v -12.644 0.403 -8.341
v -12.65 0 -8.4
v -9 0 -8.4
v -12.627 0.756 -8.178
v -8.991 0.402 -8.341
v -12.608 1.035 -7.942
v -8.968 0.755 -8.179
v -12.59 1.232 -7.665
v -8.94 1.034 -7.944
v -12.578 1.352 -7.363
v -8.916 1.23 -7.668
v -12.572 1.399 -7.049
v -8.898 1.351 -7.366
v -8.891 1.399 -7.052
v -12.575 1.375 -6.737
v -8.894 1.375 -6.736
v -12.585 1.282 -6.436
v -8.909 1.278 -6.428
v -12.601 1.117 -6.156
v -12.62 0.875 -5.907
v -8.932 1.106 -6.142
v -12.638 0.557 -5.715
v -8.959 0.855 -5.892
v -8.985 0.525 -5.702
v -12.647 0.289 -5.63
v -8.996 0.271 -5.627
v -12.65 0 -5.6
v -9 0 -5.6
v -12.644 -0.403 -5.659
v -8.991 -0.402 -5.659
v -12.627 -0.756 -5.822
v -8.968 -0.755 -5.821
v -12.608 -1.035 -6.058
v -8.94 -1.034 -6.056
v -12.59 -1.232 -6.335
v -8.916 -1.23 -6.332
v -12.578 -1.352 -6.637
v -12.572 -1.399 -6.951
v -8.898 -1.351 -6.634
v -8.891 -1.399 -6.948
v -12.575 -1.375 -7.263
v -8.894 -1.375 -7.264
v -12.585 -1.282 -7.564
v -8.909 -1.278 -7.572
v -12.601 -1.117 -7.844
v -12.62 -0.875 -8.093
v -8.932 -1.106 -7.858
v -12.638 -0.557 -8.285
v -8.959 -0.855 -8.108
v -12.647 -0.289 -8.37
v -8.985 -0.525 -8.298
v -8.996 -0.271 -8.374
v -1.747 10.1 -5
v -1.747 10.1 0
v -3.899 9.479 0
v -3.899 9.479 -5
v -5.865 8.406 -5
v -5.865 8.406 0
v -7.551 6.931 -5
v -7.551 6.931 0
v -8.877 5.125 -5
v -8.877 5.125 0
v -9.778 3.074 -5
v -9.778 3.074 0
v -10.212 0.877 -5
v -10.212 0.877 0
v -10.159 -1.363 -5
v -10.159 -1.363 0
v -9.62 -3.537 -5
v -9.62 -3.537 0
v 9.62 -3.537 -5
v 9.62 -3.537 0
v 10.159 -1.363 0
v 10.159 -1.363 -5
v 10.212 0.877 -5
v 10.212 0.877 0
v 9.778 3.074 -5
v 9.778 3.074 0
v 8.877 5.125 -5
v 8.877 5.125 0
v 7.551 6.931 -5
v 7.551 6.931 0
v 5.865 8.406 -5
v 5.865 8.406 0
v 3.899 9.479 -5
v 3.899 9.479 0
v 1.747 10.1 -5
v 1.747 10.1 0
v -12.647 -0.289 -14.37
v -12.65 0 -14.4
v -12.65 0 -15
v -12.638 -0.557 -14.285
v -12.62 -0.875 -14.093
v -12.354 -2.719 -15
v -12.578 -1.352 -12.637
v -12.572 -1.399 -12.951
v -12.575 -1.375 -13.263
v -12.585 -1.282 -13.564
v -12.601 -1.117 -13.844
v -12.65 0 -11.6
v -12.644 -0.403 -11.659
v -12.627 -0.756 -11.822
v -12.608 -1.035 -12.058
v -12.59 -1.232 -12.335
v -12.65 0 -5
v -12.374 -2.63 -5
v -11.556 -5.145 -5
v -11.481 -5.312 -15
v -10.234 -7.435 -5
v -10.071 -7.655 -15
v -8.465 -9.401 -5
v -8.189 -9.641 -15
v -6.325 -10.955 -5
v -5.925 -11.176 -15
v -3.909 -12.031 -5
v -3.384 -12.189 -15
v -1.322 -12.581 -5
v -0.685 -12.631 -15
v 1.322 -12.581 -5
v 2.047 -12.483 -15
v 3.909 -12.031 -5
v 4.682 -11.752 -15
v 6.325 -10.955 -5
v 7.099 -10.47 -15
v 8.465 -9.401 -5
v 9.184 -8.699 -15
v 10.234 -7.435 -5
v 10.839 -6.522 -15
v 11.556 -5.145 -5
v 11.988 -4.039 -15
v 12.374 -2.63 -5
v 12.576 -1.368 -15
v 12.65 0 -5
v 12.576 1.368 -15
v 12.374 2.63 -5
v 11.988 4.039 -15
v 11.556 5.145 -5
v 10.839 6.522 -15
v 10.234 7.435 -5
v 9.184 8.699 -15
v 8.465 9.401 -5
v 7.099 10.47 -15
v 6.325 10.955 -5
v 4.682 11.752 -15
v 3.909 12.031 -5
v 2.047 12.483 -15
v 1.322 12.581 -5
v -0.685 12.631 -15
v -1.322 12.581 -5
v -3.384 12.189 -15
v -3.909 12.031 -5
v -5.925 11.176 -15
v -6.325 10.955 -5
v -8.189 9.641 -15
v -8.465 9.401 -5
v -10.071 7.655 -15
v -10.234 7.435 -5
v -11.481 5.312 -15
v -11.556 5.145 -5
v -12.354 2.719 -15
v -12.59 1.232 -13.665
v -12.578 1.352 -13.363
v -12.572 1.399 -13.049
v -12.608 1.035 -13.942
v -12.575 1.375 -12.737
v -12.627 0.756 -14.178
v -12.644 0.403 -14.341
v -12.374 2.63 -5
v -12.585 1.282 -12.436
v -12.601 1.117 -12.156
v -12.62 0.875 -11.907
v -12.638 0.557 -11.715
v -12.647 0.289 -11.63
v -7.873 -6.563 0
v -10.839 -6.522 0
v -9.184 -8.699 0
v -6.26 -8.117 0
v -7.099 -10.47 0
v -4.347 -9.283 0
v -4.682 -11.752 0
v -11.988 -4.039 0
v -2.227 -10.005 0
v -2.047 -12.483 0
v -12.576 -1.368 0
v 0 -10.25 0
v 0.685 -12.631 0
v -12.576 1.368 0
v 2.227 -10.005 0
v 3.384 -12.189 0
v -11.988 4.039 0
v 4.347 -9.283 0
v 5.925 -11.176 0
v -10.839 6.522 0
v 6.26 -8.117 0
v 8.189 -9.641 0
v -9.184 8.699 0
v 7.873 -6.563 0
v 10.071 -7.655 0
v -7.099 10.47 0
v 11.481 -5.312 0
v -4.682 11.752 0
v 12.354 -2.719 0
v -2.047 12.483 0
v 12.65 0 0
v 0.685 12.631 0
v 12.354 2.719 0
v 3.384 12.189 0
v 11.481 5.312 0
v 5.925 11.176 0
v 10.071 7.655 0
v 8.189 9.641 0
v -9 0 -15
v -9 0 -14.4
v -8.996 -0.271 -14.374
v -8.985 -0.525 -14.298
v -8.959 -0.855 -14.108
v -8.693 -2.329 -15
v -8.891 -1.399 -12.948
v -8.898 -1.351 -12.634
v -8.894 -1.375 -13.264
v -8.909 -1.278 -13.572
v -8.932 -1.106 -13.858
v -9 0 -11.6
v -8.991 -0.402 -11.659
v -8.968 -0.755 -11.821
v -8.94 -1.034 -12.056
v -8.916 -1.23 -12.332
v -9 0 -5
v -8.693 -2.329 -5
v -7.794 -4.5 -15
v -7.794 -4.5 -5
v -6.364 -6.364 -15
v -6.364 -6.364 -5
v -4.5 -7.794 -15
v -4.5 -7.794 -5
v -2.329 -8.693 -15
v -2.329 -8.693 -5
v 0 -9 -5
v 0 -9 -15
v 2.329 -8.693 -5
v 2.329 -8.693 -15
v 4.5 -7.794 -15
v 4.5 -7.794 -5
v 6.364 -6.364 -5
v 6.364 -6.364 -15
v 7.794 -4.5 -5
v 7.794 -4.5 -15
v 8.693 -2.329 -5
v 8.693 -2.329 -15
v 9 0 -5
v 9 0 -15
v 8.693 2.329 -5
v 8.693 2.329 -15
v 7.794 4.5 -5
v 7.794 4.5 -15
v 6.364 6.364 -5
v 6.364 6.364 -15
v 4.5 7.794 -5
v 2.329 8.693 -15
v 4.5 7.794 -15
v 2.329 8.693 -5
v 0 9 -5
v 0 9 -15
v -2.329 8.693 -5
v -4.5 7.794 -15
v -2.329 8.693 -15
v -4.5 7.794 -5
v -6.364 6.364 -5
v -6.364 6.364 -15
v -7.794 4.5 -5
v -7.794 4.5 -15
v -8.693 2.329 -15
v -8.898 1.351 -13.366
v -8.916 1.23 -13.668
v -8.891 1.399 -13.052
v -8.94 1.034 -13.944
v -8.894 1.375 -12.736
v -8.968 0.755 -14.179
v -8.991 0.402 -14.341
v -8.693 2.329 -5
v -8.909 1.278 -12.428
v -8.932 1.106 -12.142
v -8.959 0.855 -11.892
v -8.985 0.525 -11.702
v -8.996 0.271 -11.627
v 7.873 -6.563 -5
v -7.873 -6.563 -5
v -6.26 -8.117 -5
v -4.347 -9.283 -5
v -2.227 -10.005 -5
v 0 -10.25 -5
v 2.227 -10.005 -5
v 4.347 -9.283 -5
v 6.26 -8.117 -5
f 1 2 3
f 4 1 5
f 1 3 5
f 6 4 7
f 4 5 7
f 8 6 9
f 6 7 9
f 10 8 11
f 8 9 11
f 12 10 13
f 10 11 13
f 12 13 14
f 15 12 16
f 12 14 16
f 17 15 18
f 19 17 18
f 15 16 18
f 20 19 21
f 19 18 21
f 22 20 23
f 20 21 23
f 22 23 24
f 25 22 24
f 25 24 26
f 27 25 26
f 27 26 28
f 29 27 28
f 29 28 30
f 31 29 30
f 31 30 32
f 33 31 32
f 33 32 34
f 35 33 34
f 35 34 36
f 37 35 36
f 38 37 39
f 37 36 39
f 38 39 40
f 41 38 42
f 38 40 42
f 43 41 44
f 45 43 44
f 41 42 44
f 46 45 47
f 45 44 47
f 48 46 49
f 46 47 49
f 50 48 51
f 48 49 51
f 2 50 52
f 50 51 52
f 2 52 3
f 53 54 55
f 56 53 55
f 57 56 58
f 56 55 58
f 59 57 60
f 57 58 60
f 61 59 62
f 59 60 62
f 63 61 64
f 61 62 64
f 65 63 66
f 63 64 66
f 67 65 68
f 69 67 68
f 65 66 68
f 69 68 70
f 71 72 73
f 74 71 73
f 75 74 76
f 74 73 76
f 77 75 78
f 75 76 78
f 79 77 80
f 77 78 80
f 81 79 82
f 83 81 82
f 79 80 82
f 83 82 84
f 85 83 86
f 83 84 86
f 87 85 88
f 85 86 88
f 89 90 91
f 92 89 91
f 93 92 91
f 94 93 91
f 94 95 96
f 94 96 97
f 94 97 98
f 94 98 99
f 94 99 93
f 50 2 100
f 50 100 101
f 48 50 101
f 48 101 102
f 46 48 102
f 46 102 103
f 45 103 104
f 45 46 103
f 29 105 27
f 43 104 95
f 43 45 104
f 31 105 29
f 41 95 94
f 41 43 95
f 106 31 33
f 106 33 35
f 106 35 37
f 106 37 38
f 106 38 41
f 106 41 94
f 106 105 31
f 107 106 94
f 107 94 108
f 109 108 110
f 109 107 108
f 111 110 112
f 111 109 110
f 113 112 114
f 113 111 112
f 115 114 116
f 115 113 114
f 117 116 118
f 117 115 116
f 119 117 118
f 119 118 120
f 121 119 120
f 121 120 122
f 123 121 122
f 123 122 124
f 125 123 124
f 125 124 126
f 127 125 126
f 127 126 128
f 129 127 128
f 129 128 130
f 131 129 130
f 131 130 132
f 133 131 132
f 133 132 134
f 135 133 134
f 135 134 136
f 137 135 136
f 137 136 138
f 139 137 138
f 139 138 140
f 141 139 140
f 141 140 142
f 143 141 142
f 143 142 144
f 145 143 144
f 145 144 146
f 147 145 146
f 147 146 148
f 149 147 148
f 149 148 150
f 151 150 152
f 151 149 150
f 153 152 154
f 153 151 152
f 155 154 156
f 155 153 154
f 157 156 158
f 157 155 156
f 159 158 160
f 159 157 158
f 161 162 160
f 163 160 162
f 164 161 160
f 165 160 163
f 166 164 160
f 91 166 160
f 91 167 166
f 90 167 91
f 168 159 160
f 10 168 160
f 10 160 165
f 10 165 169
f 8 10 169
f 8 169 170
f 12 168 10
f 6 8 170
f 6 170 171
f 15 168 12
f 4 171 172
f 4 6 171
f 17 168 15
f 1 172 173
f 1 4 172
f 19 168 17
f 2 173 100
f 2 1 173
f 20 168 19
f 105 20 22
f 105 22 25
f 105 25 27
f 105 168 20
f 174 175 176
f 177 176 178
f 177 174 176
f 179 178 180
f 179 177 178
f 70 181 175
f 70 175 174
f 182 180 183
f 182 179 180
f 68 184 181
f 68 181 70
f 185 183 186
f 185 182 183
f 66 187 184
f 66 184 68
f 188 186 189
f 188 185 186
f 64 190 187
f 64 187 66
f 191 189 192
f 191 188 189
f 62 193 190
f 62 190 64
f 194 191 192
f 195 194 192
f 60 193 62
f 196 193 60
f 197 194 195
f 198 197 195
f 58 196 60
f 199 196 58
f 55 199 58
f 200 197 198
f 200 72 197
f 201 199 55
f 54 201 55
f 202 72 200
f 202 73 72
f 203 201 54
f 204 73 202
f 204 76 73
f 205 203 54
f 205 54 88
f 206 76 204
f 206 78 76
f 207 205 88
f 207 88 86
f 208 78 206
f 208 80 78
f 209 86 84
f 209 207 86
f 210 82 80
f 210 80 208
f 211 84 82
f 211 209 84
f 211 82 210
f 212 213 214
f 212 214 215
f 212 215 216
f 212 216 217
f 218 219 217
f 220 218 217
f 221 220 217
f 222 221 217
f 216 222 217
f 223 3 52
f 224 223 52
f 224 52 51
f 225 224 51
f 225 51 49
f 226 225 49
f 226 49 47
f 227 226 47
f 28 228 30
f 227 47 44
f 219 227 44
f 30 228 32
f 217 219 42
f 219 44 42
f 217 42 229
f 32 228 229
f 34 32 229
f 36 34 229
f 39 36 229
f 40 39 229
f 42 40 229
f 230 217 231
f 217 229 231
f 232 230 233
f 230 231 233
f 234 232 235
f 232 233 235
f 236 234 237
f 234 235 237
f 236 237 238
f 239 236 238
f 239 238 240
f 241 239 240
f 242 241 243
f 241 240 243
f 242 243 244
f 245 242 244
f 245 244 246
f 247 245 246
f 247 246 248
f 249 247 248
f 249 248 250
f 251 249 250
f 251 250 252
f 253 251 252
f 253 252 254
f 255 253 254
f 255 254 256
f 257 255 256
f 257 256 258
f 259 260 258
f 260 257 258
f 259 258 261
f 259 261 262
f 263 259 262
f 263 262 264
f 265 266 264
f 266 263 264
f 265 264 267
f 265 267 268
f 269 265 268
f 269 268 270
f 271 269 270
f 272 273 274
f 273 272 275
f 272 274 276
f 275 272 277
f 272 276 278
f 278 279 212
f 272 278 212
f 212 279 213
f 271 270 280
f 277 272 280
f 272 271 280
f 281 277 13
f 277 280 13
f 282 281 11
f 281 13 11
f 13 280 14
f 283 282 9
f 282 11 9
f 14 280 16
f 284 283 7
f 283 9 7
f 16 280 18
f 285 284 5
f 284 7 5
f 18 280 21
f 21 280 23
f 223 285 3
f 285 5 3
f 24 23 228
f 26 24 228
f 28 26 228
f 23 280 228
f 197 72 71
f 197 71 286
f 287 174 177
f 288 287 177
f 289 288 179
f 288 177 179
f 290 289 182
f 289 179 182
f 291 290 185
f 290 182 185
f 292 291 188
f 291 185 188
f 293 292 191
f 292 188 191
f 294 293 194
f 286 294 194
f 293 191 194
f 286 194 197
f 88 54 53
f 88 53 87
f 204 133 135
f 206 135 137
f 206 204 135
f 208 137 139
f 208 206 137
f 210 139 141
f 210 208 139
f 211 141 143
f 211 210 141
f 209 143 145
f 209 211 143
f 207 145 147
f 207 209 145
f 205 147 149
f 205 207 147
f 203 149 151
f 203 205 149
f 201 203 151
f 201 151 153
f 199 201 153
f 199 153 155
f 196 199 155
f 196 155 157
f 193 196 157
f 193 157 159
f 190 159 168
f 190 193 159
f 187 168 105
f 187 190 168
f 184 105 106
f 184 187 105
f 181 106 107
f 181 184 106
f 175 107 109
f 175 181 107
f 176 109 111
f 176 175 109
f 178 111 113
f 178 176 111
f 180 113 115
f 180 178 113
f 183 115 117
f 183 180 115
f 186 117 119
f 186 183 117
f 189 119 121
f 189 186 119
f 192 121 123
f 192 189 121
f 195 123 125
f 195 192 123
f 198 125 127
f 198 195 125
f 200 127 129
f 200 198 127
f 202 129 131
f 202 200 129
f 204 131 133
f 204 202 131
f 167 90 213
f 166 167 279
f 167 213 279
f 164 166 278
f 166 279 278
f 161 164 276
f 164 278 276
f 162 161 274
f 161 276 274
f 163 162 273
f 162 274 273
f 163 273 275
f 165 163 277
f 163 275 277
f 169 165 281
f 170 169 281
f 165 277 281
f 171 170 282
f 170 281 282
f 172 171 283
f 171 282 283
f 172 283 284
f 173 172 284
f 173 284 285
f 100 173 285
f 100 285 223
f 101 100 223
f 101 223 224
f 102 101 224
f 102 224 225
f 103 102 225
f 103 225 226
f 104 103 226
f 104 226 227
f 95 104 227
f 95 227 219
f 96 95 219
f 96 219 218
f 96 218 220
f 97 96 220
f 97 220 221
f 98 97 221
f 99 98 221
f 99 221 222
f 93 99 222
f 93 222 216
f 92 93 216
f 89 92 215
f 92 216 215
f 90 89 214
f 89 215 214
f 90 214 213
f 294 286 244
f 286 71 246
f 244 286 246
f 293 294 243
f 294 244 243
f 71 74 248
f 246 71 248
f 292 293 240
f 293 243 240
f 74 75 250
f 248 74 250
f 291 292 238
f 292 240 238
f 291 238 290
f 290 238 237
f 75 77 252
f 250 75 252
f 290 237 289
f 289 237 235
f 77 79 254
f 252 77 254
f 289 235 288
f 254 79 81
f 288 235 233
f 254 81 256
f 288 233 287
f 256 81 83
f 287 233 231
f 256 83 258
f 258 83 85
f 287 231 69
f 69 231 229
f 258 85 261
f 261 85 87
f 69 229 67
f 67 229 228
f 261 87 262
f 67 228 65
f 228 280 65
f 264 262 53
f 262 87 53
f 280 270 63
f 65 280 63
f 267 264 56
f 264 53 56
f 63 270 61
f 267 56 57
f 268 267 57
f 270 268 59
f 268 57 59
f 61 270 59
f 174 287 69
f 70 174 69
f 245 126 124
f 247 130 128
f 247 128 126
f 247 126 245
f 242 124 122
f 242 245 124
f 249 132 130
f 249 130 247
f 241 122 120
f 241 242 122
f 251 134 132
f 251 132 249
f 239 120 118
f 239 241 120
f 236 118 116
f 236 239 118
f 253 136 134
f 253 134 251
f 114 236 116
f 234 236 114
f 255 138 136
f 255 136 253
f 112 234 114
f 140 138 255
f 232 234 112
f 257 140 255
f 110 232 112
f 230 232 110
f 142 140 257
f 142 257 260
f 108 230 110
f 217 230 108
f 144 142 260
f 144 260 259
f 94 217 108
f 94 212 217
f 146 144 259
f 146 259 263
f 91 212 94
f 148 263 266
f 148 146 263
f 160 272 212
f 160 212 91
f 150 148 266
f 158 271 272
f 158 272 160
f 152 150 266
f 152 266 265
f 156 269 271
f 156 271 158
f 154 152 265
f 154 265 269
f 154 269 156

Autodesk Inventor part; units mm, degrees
ref_plane "YZ Plane" through (0, 0, 0) normal (1, 0, 0) x (0, 1, 0)
ref_plane "XZ Plane" through (0, 0, 0) normal (0, 1, 0) x (-1, 0, 0)
ref_plane "XY Plane" through (0, 0, 0) normal (0, 0, 1) x (1, 0, 0)
sketch "Sketch1" plane through (0, 0, 0) normal (0, 0, 1) x (1, 0, 0)
  line L0 (9.6801, -14.008) -> (7.2052, -11.5331) construction
  line L1 (7.2052, -11.5331) -> (11.5893, -7.1491) construction
  line L2 (11.5893, -7.1491) -> (14.0642, -9.6239) construction
  line L3 (14.0642, -9.6239) -> (9.6801, -14.008) construction
  arc A0 (12.6369, -4.7496) -> (4.7496, -12.6369) centre (0, 0) ccw construction
  line L4 (10.9298, -3.0424) -> (12.6369, -4.7496) construction
  line L5 (11.6618, -4.6122) -> (10.9298, -3.0424) construction
  arc A1 (11.6618, -4.6122) -> (10.8551, -4.47) centre (11.2086, -4.8235) ccw construction
  line L6 (10.7915, -4.5335) -> (10.8551, -4.47) construction
  arc A2 (10.7915, -4.5335) -> (10.6527, -4.9738) centre (11.1451, -4.887) ccw construction
  line L7 (10.915, -6.4612) -> (10.6527, -4.9738) construction
  arc A3 (10.7761, -6.9016) -> (10.915, -6.4612) centre (10.4226, -6.548) ccw construction
  line L8 (6.9016, -10.7761) -> (10.7761, -6.9016) construction
  arc A4 (6.4612, -10.915) -> (6.9016, -10.7761) centre (6.548, -10.4226) ccw construction
  line L9 (6.4612, -10.915) -> (4.9738, -10.6527) construction
  arc A5 (4.9738, -10.6527) -> (4.5335, -10.7915) centre (4.887, -11.1451) ccw construction
  line L10 (4.5335, -10.7915) -> (4.47, -10.8551) construction
  arc A6 (4.47, -10.8551) -> (4.6122, -11.6618) centre (4.8235, -11.2086) ccw construction
  line L11 (4.6122, -11.6618) -> (3.0424, -10.9298) construction
  line L12 (3.0424, -10.9298) -> (4.7496, -12.6369) construction
  line L13 (-1.7167, -14.6498) -> (-1.7167, -17.5) construction
  line L14 (-1.7167, -17.5) -> (1.7167, -17.5) construction
  line L15 (1.7167, -14.6498) -> (1.7167, -17.5) construction
  arc A7 (1.7167, -14.6498) -> (6.9595, -13.0049) centre (0, 0) ccw construction
  arc A8 (6.9595, -13.0049) -> (8.2728, -15.1789) centre (8.2994, -13.6792) ccw construction
  line L16 (8.2728, -15.1789) -> (7.6816, -15.1684) construction
  arc A9 (8.5249, -17.8901) -> (7.6816, -15.1684) centre (7.655, -16.6682) ccw construction
  line L17 (8.5249, -17.8901) -> (13.5161, -14.3366) construction
  line L18 (13.5161, -14.3366) -> (13.5161, -12.2823) construction
  line L19 (13.5161, -12.2823) -> (14.6168, -12.2823) construction
  line L20 (14.6168, -12.2823) -> (14.6168, -1.9776) construction
  arc A10 (14.6168, -1.9776) -> (1.7167, 14.6498) centre (0, 0) ccw construction
  line L21 (1.7167, 14.6498) -> (1.7167, 17.5) construction
  line L22 (-1.7167, 17.5) -> (1.7167, 17.5) construction
  line L23 (-1.7167, 14.6498) -> (-1.7167, 17.5) construction
  arc A11 (-1.7167, 14.6498) -> (-14.2817, -3.6872) centre (0, 0) ccw construction
  line L24 (-14.2817, -3.6872) -> (-15.4135, -5.7935) construction
  arc A12 (-15.4135, -5.7935) -> (-14.5984, -8.502) centre (-13.6517, -6.7402) ccw construction
  line L25 (-14.5984, -8.502) -> (-9.6326, -11.1703) construction
  arc A13 (-9.6326, -11.1703) -> (-1.7167, -14.6498) centre (0, 0) ccw construction
  line L26 (-24.6, 24.6) -> (25.2, -25.2) construction
  line L27 (25.2, 24.6) -> (-24.6, -25.2) construction
  arc A14 (-1.7471, 10.1) -> (-9.6204, -3.5369) centre (0, 0) ccw
  circle A15 centre (0, 0) radius 10.1 construction
  line L28 (-1.7471, 10.1) -> (1.7471, 10.1)
  line L29 (-7.8733, -6.5631) -> (-9.6204, -3.5369)
  line L30 (9.6204, -3.5369) -> (7.8733, -6.5631)
  arc A16 (1.7471, 10.1) -> (-1.7471, 10.1) centre (0, 0) ccw
  arc A17 (9.6204, -3.5369) -> (1.7471, 10.1) centre (0, 0) ccw
  arc A18 (7.8733, -6.5631) -> (9.6204, -3.5369) centre (0, 0) ccw
  arc A19 (-7.8733, -6.5631) -> (7.8733, -6.5631) centre (0, 0) ccw
  arc A20 (-9.6204, -3.5369) -> (-7.8733, -6.5631) centre (0, 0) ccw
  arc A21 (10.7786, -4.5205) -> (10.6704, -4.6789) centre (11.1451, -4.887) ccw construction
  line L31 (10.7786, -4.5205) -> (10.8421, -4.457) construction
  arc A22 (11.7261, -4.7937) -> (10.8421, -4.457) centre (11.2086, -4.8235) ccw construction
  line L32 (11.7261, -4.7937) -> (10.8691, -2.9558) construction
  line L33 (10.8691, -2.9558) -> (12.6297, -4.7164) construction
  line L34 (4.7164, -12.6297) -> (2.9558, -10.8691) construction
  line L35 (2.9558, -10.8691) -> (4.4463, -11.5641) construction
  arc A23 (4.457, -10.8421) -> (4.4463, -11.5641) centre (4.8235, -11.2086) ccw construction
  line L36 (4.457, -10.8421) -> (4.5223, -10.7767) construction
  arc A24 (4.977, -10.6346) -> (4.6789, -10.6704) centre (4.887, -11.1451) ccw
  arc A25 (4.6789, -10.6704) -> (4.5223, -10.7767) centre (4.887, -11.1451) ccw construction
  arc A26 (10.6704, -4.6789) -> (10.6346, -4.977) centre (11.1451, -4.887) ccw
  circle A27 centre (0, 0) radius 12.65
  dimension "d4" = 20.2
  dimension "d6" = 20.5
  dimension "d9" = 360
  dimension "d28" = 25.3
extrude "Extrusion1" add sketch "Sketch1" against normal blind 5 contours A16 L28 | L29 A20 | A18 L30 | A27
sketch "Sketch3" plane through (0, 0, -5) normal (0, 0, -1) x (-1, 0, 0)
  arc A0 (-7.8733, -6.5631) -> (7.8733, -6.5631) centre (0, 0) ccw projected
  circle A1 centre (0, 0) radius 9
  circle A2 centre (0, 0) radius 11.5312
  circle A3 centre (0, 0) radius 12.65 projected
  line L0 (9.6204, -3.5369) -> (7.8733, -6.5631) projected
  line L1 (-7.8733, -6.5631) -> (-9.6204, -3.5369) projected
  arc A4 (-1.7471, 10.1) -> (-9.6204, -3.5369) centre (0, 0) ccw projected
  line L2 (-1.7471, 10.1) -> (1.7471, 10.1) projected
  arc A5 (9.6204, -3.5369) -> (1.7471, 10.1) centre (0, 0) ccw projected
  dimension "d17" = 18
extrude "Extrusion3" add sketch "Sketch3" along normal blind 10 contours L1 A4 L2 A5 L0 A0 | A2 | A3
sketch "Sketch4" plane through (0, -10.7054, 0) normal (1, 0, 0) x (0, 0, -1)
  line L0 (15, 19.7054) -> (15, 1.7054) projected
  line L1 (5, 1.7054) -> (5, 19.7054) projected
  circle A0 centre (13, 10.7054) radius 1.4
  circle A1 centre (7, 10.7054) radius 1.4
  dimension "d24" = 2.8
  dimension "d25" = 2.8
  dimension "d26" = 6
  dimension "d27" = 2
extrude "Extrusion4" cut sketch "Sketch4" against normal through all
properties part number "20_focus_inlet_objective_mount_v8"
